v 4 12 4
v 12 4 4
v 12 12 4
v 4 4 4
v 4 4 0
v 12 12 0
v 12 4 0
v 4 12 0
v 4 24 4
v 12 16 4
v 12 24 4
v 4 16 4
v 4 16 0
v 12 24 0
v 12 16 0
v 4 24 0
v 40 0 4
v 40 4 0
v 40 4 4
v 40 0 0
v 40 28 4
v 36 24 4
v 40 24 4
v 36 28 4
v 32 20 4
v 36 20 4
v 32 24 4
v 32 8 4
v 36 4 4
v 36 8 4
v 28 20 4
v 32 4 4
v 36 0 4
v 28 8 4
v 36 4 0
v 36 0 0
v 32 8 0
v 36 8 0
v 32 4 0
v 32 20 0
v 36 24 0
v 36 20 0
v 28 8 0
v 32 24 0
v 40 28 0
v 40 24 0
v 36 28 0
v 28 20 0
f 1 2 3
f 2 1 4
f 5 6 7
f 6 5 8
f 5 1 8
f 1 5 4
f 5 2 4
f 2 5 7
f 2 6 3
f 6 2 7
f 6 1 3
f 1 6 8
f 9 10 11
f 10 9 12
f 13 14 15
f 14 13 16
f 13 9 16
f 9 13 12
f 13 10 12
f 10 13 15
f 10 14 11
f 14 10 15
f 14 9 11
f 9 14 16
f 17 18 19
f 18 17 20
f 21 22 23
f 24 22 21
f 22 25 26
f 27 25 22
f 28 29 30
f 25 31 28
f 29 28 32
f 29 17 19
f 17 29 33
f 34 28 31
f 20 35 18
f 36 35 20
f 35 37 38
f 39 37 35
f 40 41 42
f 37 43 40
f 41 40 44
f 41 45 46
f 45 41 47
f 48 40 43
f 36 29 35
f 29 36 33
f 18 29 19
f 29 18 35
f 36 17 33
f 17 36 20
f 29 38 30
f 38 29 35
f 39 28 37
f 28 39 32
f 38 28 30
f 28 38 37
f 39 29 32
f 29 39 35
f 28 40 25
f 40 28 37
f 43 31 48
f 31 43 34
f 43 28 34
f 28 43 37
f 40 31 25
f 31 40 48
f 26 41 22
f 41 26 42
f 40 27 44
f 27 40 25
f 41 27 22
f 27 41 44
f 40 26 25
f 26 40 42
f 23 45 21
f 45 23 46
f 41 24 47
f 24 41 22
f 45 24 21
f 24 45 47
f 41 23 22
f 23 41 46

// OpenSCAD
//Draw text
scale([4,4,4]) drawtext(":(");

//Draw character set
//scale([2,2,2]) drawtext(" !\"#$%&'()*+,-./0123456789:;<=>?@ABCDEFGHIJKLMNOPQRSTUVWXYZ[\\]^_`abcdefghijklmnopqrstuvwxyz{|}");

module drawtext(text) {
	//Characters
	chars = " !\"#$%&'()*+,-./0123456789:;<=>?@ABCDEFGHIJKLMNOPQRSTUVWXYZ[\\]^_`abcdefghijklmnopqrstuvwxyz{|}";

	//Chracter table defining 5x7 characters
	//Adapted from: http://www.geocities.com/dinceraydin/djlcdsim/chartable.js
	char_table = [ [ 0, 0, 0, 0, 0, 0, 0],
                  [ 4, 0, 4, 4, 4, 4, 4],
                  [ 0, 0, 0, 0,10,10,10],
                  [10,10,31,10,31,10,10],
                  [ 4,30, 5,14,20,15, 4],
                  [ 3,19, 8, 4, 2,25,24],
                  [13,18,21, 8,20,18,12],
                  [ 0, 0, 0, 0, 8, 4,12],
                  [ 2, 4, 8, 8, 8, 4, 2],
                  [ 8, 4, 2, 2, 2, 4, 8],
                  [ 0, 4,21,14,21, 4, 0],
                  [ 0, 4, 4,31, 4, 4, 0],
                  [ 8, 4,12, 0, 0, 0, 0],
                  [ 0, 0, 0,31, 0, 0, 0],
                  [12,12, 0, 0, 0, 0, 0],
                  [ 0,16, 8, 4, 2, 1, 0],
                  [14,17,25,21,19,17,14],
                  [14, 4, 4, 4, 4,12, 4],
                  [31, 8, 4, 2, 1,17,14],
                  [14,17, 1, 2, 4, 2,31],
                  [ 2, 2,31,18,10, 6, 2],
                  [14,17, 1, 1,30,16,31],
                  [14,17,17,30,16, 8, 6],
                  [ 8, 8, 8, 4, 2, 1,31],
                  [14,17,17,14,17,17,14],
                  [12, 2, 1,15,17,17,14],
                  [ 0,12,12, 0,12,12, 0],
                  [ 8, 4,12, 0,12,12, 0],
                  [ 2, 4, 8,16, 8, 4, 2],
                  [ 0, 0,31, 0,31, 0, 0],
                  [16, 8, 4, 2, 4, 8,16],
                  [ 4, 0, 4, 2, 1,17,14],
                  [14,21,21,13, 1,17,14],
                  [17,17,31,17,17,17,14],
                  [30,17,17,30,17,17,30],
                  [14,17,16,16,16,17,14],
                  [30,17,17,17,17,17,30],
                  [31,16,16,30,16,16,31],
                  [16,16,16,30,16,16,31],
                  [15,17,17,23,16,17,14],
                  [17,17,17,31,17,17,17],
                  [14, 4, 4, 4, 4, 4,14],
                  [12,18, 2, 2, 2, 2, 7],
                  [17,18,20,24,20,18,17],
                  [31,16,16,16,16,16,16],
                  [17,17,17,21,21,27,17],
                  [17,17,19,21,25,17,17],
                  [14,17,17,17,17,17,14],
                  [16,16,16,30,17,17,30],
                  [13,18,21,17,17,17,14],
                  [17,18,20,30,17,17,30],
                  [30, 1, 1,14,16,16,15],
                  [ 4, 4, 4, 4, 4, 4,31],
                  [14,17,17,17,17,17,17],
                  [ 4,10,17,17,17,17,17],
                  [10,21,21,21,17,17,17],
                  [17,17,10, 4,10,17,17],
                  [ 4, 4, 4,10,17,17,17],
                  [31,16, 8, 4, 2, 1,31],
                  [14, 8, 8, 8, 8, 8,14],
                  [ 0, 1, 2, 4, 8,16, 0],
                  [14, 2, 2, 2, 2, 2,14],
                  [ 0, 0, 0, 0,17,10, 4],
                  [31, 0, 0, 0, 0, 0, 0],
                  [ 0, 0, 0, 0, 2, 4, 8],
                  [15,17,15, 1,14, 0, 0],
                  [30,17,17,25,22,16,16],
                  [14,17,16,16,14, 0, 0],
                  [15,17,17,19,13, 1, 1],
                  [14,16,31,17,14, 0, 0],
                  [ 8, 8, 8,28, 8, 9, 6],
                  [14, 1,15,17,15, 0, 0],
                  [17,17,17,25,22,16,16],
                  [14, 4, 4, 4,12, 0, 4],
                  [12,18, 2, 2, 2, 6, 2],
                  [18,20,24,20,18,16,16],
                  [14, 4, 4, 4, 4, 4,12],
                  [17,17,21,21,26, 0, 0],
                  [17,17,17,25,22, 0, 0],
                  [14,17,17,17,14, 0, 0],
                  [16,16,30,17,30, 0, 0],
                  [ 1, 1,15,19,13, 0, 0],
                  [16,16,16,25,22, 0, 0],
                  [30, 1,14,16,15, 0, 0],
                  [ 6, 9, 8, 8,28, 8, 8],
                  [13,19,17,17,17, 0, 0],
                  [ 4,10,17,17,17, 0, 0],
                  [10,21,21,17,17, 0, 0],
                  [17,10, 4,10,17, 0, 0],
                  [14, 1,15,17,17, 0, 0],
                  [31, 8, 4, 2,31, 0, 0],
                  [ 2, 4, 4, 8, 4, 4, 2],
                  [ 4, 4, 4, 4, 4, 4, 4],
                  [ 8, 4, 4, 2, 4, 4, 8] ];

	//Binary decode table
	dec_table = [ "00000", "00001", "00010", "00011", "00100", "00101",
  	            "00110", "00111", "01000", "01001", "01010", "01011",
  	            "01100", "01101", "01110", "01111", "10000", "10001",
  	            "10010", "10011", "10100", "10101", "10110", "10111",
	            "11000", "11001", "11010", "11011", "11100", "11101",
	            "11110", "11111" ];

	//Process string one character at a time
	for(itext = [0:len(text)-1]) {
		//Convert character to index
		assign(ichar = search(text[itext],chars,1)[0]) {
			//Decode character - rows
			for(irow = [0:6]) {
				assign(val = dec_table[char_table[ichar][irow]]) {
					//Decode character - cols
					for(icol = [0:4]) {
						assign(bit = search(val[icol],"01",1)[0]) {
							if(bit) {
								//Output cube
								translate([icol + (6*itext), irow, 0])
									cube([1.0001,1.0001,1]);
							}
						}
					}
				}
			}
		}
	}
}
